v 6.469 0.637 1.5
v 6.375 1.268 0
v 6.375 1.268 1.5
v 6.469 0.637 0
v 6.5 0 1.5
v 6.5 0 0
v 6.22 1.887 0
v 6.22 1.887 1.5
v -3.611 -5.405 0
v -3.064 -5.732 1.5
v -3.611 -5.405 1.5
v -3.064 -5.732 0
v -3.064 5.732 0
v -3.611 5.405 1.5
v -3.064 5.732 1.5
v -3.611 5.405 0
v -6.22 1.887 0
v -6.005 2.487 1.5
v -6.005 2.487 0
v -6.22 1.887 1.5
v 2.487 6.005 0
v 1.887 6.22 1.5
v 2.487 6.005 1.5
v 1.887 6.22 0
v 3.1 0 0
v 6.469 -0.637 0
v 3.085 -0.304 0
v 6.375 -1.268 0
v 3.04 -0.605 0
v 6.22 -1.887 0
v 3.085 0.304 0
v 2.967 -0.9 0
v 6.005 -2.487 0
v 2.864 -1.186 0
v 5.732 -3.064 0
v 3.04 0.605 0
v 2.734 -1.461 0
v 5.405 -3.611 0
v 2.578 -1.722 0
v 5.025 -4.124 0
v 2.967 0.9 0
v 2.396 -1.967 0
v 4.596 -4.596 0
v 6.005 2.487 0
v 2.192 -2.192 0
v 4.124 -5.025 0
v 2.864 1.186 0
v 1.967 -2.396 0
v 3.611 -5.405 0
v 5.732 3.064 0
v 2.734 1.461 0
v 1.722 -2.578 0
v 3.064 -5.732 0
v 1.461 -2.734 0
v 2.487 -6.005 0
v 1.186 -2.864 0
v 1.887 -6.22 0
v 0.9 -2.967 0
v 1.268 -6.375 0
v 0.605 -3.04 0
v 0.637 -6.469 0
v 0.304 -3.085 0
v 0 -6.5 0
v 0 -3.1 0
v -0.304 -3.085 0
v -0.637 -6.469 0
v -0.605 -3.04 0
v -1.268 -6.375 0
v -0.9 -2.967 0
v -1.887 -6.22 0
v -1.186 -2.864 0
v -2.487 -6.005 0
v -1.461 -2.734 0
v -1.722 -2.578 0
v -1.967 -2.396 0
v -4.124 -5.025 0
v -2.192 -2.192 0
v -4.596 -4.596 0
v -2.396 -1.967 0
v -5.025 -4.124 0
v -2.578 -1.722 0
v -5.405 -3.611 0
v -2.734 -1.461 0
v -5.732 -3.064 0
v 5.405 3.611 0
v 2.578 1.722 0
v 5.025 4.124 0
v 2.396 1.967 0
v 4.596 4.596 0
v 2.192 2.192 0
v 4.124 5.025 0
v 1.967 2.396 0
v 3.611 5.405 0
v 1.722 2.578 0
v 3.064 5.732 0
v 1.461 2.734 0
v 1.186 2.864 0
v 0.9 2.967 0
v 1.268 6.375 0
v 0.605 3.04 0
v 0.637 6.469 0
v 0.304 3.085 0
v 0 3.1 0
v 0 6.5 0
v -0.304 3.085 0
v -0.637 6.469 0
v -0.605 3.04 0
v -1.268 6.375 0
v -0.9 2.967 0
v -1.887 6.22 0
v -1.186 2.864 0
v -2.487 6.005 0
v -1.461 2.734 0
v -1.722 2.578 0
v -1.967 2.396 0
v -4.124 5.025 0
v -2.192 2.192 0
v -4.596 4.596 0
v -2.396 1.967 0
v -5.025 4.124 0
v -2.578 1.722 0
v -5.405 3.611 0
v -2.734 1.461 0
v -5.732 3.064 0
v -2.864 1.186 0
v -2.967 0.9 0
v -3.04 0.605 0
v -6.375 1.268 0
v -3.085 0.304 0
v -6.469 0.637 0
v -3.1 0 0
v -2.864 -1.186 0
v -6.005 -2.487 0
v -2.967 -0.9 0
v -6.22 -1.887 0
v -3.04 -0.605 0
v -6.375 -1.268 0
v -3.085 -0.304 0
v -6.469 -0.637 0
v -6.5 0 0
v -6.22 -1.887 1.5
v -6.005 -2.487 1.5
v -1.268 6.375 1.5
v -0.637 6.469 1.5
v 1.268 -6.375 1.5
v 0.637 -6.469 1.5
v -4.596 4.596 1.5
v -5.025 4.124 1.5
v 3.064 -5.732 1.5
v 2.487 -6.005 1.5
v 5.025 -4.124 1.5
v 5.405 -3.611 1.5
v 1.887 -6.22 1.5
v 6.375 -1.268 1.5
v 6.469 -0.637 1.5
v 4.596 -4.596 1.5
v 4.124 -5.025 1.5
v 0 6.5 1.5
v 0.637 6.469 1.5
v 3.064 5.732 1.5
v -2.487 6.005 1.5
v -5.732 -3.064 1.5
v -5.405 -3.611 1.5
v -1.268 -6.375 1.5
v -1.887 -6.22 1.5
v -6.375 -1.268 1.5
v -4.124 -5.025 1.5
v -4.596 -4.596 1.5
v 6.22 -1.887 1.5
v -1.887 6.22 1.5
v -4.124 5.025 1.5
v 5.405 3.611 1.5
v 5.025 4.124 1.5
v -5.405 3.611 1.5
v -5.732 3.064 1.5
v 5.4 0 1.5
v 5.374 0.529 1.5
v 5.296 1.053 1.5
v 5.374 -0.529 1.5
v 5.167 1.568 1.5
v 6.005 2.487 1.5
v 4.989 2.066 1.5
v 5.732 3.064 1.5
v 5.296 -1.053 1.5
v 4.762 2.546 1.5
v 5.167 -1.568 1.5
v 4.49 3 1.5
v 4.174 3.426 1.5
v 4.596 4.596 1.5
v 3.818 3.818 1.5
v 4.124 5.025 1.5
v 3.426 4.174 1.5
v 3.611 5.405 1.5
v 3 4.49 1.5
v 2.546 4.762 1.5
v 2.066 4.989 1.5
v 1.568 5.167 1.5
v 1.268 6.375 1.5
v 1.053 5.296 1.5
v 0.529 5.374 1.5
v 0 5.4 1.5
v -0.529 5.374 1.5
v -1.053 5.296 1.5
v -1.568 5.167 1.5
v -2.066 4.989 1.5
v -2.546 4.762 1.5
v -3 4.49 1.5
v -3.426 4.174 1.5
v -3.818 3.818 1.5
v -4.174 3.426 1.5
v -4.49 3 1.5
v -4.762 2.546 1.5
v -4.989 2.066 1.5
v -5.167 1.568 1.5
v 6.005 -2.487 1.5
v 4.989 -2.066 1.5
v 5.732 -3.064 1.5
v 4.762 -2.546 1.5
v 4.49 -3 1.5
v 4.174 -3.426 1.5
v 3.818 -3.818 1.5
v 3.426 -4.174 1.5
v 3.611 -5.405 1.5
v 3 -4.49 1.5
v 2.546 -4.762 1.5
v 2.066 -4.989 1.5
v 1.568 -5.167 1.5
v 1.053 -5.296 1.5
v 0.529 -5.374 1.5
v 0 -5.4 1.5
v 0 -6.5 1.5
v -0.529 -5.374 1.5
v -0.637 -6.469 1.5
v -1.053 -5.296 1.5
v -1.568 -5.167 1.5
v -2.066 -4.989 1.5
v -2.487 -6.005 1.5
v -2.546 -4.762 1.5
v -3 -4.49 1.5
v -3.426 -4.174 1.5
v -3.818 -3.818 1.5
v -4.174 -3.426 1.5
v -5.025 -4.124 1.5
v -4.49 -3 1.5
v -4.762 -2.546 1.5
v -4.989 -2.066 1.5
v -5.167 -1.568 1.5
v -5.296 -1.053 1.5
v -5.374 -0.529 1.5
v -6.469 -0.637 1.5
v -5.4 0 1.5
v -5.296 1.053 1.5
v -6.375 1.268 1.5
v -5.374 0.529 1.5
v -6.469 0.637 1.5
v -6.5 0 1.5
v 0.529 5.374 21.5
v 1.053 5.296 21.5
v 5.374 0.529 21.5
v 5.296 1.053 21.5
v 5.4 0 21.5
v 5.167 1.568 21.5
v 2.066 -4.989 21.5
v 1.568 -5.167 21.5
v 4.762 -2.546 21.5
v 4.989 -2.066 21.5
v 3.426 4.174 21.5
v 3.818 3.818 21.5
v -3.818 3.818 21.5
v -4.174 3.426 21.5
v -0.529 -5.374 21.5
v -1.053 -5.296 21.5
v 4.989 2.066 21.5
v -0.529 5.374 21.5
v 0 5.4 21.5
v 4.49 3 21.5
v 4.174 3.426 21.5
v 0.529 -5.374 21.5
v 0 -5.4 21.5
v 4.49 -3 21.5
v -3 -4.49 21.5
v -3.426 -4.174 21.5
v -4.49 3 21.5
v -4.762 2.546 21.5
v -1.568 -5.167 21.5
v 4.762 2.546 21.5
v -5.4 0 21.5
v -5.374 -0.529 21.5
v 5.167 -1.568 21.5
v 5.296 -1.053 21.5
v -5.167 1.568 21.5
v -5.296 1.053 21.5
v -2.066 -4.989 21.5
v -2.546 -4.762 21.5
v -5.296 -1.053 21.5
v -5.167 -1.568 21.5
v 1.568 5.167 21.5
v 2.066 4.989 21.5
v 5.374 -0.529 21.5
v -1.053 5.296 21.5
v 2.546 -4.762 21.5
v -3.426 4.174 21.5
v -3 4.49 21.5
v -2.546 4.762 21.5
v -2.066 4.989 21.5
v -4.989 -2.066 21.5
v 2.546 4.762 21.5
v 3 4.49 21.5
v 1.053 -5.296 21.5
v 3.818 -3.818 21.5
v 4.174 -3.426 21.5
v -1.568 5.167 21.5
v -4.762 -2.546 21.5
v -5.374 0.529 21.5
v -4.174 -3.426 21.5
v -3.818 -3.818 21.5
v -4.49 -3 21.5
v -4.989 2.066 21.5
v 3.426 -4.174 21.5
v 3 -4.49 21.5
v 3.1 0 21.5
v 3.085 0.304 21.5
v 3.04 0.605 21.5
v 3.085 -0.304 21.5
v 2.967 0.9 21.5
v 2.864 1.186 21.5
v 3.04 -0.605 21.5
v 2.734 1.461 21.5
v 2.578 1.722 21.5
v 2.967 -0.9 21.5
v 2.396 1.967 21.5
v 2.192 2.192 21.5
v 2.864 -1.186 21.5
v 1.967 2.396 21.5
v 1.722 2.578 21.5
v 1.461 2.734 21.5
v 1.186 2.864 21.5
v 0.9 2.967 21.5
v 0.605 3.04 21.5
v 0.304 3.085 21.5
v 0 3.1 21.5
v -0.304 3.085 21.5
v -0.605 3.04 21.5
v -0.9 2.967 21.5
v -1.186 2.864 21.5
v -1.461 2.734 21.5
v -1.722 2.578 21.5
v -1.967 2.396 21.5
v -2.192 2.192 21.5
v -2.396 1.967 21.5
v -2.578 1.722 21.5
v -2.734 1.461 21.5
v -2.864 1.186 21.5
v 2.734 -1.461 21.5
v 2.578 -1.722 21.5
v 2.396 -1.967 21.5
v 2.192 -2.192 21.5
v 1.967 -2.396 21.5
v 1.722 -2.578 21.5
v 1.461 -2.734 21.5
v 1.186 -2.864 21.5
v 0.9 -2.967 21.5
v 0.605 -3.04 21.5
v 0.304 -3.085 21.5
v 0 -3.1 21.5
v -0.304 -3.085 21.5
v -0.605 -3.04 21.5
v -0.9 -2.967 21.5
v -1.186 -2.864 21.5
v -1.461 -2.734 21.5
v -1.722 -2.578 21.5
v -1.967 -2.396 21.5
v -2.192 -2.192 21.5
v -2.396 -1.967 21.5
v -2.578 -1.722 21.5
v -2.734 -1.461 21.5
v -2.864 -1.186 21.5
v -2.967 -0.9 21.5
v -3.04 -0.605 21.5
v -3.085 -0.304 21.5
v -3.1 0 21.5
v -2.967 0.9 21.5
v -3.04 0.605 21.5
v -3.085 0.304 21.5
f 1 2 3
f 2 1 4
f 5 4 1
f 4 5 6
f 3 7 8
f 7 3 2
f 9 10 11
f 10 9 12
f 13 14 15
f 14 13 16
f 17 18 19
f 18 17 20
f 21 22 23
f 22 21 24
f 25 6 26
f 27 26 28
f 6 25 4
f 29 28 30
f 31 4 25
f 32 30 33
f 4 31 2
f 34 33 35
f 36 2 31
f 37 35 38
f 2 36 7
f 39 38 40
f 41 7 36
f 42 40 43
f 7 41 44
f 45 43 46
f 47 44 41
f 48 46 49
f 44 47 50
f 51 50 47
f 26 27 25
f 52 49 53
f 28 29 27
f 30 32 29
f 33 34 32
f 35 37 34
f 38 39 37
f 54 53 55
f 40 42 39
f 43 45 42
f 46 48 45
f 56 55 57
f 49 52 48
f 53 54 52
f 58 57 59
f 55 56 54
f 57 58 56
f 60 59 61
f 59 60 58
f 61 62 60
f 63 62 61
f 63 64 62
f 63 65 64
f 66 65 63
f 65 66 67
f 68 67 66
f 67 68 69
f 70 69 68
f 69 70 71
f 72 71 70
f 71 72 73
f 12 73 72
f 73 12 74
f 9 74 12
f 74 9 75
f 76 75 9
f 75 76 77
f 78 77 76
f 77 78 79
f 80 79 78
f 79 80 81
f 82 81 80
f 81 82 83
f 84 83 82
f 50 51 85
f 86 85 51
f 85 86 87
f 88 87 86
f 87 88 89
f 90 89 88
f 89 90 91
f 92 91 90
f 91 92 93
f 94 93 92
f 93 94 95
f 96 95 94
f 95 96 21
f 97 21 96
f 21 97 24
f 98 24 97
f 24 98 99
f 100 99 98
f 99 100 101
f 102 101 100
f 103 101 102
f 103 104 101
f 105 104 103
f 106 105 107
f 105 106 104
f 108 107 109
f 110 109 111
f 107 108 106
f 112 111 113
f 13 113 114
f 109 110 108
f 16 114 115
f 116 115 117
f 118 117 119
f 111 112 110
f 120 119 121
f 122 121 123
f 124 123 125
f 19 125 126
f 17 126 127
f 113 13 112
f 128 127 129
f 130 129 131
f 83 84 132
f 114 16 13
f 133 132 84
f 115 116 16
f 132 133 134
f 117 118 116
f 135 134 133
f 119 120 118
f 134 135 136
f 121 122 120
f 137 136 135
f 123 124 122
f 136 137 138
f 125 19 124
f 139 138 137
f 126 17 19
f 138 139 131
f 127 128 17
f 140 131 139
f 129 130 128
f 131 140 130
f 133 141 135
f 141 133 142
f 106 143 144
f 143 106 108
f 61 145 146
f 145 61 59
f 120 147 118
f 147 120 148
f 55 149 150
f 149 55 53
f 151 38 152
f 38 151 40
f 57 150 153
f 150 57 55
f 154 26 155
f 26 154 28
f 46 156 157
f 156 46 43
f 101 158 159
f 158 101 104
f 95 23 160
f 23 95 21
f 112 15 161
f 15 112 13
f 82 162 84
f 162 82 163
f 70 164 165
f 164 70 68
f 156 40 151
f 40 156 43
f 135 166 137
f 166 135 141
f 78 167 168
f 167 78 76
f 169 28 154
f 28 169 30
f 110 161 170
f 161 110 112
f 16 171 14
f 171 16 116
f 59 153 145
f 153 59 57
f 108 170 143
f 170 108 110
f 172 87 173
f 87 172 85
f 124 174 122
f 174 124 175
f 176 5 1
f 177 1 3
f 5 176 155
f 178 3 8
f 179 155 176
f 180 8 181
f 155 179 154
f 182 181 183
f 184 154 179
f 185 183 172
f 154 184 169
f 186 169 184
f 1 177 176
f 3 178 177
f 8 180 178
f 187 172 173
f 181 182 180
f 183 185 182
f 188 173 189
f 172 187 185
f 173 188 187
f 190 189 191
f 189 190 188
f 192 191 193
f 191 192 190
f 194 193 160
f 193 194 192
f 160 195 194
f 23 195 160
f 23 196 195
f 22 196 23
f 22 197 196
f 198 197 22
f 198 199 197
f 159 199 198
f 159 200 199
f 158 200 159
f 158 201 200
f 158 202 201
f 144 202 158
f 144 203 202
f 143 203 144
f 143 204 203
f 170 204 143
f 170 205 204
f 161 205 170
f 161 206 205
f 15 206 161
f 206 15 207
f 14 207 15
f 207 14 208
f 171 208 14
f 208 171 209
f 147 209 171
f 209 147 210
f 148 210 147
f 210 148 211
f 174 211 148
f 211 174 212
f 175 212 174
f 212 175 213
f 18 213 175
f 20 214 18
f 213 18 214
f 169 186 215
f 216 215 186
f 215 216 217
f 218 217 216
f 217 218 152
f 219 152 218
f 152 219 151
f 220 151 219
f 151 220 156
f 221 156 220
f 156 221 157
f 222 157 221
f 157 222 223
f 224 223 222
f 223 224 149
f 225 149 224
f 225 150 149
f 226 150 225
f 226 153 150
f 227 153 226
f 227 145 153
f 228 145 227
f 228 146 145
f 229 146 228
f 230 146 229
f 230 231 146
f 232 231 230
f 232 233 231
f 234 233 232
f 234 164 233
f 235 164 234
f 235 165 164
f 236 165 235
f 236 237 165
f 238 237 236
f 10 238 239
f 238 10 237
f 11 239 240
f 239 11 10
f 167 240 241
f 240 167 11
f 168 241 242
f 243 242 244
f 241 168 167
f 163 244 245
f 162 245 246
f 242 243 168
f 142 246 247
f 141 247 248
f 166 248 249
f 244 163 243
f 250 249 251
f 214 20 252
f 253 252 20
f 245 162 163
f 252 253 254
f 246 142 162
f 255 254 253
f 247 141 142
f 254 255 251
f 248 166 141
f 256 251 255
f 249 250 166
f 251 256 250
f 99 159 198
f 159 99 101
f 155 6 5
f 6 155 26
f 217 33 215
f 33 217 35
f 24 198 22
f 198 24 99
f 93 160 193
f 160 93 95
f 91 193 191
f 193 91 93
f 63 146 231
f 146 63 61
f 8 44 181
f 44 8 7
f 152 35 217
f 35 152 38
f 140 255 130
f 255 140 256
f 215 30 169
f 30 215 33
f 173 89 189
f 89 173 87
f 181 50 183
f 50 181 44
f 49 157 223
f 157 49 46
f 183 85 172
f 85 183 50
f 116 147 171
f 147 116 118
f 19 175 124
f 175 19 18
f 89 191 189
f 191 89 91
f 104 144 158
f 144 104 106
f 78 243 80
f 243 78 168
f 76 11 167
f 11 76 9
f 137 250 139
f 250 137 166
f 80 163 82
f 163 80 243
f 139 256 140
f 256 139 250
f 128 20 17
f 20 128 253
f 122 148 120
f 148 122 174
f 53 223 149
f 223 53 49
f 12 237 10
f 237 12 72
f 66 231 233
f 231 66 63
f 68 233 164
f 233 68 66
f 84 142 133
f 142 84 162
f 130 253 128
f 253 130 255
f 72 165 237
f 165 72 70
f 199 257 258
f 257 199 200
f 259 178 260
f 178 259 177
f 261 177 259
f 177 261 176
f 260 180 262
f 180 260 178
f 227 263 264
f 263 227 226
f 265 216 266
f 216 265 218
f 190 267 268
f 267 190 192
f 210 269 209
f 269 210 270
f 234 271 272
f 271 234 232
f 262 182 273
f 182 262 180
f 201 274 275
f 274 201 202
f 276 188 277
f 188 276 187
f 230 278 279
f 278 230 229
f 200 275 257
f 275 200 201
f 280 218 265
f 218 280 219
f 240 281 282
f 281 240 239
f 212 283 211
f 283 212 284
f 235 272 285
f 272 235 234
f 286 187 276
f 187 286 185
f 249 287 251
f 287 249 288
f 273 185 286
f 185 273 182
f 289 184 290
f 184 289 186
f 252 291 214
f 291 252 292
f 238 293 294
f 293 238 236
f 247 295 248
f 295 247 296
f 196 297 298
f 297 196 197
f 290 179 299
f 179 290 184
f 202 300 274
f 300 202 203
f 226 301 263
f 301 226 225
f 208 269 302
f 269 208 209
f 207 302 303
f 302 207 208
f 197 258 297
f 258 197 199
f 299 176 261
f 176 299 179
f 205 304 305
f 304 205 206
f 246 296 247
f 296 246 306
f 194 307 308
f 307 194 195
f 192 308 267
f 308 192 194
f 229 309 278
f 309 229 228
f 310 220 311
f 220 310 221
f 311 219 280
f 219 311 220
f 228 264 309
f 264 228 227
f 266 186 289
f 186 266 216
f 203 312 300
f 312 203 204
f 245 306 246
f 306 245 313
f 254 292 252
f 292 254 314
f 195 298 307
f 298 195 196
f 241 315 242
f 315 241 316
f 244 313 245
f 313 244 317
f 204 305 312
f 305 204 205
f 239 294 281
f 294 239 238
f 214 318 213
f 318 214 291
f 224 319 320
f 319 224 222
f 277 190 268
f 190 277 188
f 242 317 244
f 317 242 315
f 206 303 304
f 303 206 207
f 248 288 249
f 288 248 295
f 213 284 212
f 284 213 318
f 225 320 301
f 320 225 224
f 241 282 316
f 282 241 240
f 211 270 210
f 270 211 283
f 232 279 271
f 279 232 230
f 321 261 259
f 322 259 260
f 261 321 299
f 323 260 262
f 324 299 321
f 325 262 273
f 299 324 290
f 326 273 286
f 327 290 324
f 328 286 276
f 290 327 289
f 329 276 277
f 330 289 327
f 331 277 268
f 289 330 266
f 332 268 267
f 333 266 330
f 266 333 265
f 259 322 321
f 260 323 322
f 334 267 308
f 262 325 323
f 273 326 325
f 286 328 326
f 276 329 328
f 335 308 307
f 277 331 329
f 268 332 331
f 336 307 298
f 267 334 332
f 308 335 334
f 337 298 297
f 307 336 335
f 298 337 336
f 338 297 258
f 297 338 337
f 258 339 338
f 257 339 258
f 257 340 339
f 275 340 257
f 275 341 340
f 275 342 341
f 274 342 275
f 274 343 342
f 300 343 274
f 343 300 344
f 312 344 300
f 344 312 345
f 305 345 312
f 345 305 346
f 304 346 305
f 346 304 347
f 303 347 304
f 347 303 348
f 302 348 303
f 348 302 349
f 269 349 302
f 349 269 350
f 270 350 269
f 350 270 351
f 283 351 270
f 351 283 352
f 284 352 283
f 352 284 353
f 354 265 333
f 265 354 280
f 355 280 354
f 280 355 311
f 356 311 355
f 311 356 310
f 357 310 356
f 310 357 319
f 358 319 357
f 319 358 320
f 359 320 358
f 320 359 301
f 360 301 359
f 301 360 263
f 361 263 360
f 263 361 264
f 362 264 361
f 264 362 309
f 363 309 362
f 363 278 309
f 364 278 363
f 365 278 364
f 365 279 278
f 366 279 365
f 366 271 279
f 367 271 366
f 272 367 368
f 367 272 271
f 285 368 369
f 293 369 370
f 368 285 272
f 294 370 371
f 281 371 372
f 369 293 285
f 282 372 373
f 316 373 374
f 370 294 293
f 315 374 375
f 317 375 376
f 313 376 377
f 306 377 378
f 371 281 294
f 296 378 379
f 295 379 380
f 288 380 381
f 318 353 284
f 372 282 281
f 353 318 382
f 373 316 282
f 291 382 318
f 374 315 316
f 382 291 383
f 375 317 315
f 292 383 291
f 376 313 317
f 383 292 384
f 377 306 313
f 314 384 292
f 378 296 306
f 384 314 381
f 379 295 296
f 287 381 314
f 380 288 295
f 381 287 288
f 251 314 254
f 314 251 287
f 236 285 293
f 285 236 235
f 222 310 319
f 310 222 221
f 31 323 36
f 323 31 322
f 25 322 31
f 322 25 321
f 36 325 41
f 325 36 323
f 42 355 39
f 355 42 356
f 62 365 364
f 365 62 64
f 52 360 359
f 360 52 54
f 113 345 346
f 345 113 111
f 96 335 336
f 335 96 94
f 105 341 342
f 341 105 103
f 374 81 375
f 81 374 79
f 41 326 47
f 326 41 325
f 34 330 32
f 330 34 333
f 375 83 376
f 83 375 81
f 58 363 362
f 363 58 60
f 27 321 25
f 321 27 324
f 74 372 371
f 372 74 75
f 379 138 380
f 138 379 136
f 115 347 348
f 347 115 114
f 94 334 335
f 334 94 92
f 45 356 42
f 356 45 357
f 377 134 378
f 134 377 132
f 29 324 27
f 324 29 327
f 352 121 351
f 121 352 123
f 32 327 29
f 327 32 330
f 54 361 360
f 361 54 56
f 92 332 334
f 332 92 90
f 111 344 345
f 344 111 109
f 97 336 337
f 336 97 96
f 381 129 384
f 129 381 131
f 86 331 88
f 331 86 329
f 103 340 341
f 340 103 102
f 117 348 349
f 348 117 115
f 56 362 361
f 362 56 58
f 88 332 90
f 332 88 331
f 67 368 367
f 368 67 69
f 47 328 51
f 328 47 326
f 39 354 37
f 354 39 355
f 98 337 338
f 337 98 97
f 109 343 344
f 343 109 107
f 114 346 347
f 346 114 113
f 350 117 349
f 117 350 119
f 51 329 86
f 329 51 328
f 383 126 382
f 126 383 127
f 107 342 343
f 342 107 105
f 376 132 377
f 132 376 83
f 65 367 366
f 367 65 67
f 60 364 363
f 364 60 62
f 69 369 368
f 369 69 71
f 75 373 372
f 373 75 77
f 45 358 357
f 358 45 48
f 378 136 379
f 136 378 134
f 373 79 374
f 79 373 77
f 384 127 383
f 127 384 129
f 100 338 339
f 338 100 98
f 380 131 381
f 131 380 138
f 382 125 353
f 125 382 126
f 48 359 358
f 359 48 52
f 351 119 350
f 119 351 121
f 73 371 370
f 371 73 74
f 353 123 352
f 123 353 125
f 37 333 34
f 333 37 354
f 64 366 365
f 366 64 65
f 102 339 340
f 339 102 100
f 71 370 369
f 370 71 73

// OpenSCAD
// PCR Tube Adapter Sleeve - fits a 0.2mL tube into a 1.5mL rack hole.
// Print orientation: Collar on bed (z=0 to 1.5), body rises to z=21.5.

// Dimensions
collar_od = 13;
collar_t  = 1.5;
body_od   = 10.8;
body_h    = 20.0; // Calculated as 21.5 (top Z) - 1.5 (collar height)
bore_d    = 6.2;

$fn = 64;

// Calculate total height for the main body block
total_h = collar_t + body_h;

difference() {
    // Main solid: Collar + Body
    union() {
        // Collar (lies flat on bed)
        translate([0, 0, 0]) 
            cylinder(h = collar_t, d = collar_od);
        
        // Body (rises from top of collar)
        translate([0, 0, collar_t]) 
            cylinder(h = body_h, d = body_od);
    }
    
    // Bore (straight hole through full height)
    // Extend slightly past top and bottom to ensure clean cut
    translate([0, 0, -1]) 
        cylinder(h = total_h + 2, d = bore_d);
}
